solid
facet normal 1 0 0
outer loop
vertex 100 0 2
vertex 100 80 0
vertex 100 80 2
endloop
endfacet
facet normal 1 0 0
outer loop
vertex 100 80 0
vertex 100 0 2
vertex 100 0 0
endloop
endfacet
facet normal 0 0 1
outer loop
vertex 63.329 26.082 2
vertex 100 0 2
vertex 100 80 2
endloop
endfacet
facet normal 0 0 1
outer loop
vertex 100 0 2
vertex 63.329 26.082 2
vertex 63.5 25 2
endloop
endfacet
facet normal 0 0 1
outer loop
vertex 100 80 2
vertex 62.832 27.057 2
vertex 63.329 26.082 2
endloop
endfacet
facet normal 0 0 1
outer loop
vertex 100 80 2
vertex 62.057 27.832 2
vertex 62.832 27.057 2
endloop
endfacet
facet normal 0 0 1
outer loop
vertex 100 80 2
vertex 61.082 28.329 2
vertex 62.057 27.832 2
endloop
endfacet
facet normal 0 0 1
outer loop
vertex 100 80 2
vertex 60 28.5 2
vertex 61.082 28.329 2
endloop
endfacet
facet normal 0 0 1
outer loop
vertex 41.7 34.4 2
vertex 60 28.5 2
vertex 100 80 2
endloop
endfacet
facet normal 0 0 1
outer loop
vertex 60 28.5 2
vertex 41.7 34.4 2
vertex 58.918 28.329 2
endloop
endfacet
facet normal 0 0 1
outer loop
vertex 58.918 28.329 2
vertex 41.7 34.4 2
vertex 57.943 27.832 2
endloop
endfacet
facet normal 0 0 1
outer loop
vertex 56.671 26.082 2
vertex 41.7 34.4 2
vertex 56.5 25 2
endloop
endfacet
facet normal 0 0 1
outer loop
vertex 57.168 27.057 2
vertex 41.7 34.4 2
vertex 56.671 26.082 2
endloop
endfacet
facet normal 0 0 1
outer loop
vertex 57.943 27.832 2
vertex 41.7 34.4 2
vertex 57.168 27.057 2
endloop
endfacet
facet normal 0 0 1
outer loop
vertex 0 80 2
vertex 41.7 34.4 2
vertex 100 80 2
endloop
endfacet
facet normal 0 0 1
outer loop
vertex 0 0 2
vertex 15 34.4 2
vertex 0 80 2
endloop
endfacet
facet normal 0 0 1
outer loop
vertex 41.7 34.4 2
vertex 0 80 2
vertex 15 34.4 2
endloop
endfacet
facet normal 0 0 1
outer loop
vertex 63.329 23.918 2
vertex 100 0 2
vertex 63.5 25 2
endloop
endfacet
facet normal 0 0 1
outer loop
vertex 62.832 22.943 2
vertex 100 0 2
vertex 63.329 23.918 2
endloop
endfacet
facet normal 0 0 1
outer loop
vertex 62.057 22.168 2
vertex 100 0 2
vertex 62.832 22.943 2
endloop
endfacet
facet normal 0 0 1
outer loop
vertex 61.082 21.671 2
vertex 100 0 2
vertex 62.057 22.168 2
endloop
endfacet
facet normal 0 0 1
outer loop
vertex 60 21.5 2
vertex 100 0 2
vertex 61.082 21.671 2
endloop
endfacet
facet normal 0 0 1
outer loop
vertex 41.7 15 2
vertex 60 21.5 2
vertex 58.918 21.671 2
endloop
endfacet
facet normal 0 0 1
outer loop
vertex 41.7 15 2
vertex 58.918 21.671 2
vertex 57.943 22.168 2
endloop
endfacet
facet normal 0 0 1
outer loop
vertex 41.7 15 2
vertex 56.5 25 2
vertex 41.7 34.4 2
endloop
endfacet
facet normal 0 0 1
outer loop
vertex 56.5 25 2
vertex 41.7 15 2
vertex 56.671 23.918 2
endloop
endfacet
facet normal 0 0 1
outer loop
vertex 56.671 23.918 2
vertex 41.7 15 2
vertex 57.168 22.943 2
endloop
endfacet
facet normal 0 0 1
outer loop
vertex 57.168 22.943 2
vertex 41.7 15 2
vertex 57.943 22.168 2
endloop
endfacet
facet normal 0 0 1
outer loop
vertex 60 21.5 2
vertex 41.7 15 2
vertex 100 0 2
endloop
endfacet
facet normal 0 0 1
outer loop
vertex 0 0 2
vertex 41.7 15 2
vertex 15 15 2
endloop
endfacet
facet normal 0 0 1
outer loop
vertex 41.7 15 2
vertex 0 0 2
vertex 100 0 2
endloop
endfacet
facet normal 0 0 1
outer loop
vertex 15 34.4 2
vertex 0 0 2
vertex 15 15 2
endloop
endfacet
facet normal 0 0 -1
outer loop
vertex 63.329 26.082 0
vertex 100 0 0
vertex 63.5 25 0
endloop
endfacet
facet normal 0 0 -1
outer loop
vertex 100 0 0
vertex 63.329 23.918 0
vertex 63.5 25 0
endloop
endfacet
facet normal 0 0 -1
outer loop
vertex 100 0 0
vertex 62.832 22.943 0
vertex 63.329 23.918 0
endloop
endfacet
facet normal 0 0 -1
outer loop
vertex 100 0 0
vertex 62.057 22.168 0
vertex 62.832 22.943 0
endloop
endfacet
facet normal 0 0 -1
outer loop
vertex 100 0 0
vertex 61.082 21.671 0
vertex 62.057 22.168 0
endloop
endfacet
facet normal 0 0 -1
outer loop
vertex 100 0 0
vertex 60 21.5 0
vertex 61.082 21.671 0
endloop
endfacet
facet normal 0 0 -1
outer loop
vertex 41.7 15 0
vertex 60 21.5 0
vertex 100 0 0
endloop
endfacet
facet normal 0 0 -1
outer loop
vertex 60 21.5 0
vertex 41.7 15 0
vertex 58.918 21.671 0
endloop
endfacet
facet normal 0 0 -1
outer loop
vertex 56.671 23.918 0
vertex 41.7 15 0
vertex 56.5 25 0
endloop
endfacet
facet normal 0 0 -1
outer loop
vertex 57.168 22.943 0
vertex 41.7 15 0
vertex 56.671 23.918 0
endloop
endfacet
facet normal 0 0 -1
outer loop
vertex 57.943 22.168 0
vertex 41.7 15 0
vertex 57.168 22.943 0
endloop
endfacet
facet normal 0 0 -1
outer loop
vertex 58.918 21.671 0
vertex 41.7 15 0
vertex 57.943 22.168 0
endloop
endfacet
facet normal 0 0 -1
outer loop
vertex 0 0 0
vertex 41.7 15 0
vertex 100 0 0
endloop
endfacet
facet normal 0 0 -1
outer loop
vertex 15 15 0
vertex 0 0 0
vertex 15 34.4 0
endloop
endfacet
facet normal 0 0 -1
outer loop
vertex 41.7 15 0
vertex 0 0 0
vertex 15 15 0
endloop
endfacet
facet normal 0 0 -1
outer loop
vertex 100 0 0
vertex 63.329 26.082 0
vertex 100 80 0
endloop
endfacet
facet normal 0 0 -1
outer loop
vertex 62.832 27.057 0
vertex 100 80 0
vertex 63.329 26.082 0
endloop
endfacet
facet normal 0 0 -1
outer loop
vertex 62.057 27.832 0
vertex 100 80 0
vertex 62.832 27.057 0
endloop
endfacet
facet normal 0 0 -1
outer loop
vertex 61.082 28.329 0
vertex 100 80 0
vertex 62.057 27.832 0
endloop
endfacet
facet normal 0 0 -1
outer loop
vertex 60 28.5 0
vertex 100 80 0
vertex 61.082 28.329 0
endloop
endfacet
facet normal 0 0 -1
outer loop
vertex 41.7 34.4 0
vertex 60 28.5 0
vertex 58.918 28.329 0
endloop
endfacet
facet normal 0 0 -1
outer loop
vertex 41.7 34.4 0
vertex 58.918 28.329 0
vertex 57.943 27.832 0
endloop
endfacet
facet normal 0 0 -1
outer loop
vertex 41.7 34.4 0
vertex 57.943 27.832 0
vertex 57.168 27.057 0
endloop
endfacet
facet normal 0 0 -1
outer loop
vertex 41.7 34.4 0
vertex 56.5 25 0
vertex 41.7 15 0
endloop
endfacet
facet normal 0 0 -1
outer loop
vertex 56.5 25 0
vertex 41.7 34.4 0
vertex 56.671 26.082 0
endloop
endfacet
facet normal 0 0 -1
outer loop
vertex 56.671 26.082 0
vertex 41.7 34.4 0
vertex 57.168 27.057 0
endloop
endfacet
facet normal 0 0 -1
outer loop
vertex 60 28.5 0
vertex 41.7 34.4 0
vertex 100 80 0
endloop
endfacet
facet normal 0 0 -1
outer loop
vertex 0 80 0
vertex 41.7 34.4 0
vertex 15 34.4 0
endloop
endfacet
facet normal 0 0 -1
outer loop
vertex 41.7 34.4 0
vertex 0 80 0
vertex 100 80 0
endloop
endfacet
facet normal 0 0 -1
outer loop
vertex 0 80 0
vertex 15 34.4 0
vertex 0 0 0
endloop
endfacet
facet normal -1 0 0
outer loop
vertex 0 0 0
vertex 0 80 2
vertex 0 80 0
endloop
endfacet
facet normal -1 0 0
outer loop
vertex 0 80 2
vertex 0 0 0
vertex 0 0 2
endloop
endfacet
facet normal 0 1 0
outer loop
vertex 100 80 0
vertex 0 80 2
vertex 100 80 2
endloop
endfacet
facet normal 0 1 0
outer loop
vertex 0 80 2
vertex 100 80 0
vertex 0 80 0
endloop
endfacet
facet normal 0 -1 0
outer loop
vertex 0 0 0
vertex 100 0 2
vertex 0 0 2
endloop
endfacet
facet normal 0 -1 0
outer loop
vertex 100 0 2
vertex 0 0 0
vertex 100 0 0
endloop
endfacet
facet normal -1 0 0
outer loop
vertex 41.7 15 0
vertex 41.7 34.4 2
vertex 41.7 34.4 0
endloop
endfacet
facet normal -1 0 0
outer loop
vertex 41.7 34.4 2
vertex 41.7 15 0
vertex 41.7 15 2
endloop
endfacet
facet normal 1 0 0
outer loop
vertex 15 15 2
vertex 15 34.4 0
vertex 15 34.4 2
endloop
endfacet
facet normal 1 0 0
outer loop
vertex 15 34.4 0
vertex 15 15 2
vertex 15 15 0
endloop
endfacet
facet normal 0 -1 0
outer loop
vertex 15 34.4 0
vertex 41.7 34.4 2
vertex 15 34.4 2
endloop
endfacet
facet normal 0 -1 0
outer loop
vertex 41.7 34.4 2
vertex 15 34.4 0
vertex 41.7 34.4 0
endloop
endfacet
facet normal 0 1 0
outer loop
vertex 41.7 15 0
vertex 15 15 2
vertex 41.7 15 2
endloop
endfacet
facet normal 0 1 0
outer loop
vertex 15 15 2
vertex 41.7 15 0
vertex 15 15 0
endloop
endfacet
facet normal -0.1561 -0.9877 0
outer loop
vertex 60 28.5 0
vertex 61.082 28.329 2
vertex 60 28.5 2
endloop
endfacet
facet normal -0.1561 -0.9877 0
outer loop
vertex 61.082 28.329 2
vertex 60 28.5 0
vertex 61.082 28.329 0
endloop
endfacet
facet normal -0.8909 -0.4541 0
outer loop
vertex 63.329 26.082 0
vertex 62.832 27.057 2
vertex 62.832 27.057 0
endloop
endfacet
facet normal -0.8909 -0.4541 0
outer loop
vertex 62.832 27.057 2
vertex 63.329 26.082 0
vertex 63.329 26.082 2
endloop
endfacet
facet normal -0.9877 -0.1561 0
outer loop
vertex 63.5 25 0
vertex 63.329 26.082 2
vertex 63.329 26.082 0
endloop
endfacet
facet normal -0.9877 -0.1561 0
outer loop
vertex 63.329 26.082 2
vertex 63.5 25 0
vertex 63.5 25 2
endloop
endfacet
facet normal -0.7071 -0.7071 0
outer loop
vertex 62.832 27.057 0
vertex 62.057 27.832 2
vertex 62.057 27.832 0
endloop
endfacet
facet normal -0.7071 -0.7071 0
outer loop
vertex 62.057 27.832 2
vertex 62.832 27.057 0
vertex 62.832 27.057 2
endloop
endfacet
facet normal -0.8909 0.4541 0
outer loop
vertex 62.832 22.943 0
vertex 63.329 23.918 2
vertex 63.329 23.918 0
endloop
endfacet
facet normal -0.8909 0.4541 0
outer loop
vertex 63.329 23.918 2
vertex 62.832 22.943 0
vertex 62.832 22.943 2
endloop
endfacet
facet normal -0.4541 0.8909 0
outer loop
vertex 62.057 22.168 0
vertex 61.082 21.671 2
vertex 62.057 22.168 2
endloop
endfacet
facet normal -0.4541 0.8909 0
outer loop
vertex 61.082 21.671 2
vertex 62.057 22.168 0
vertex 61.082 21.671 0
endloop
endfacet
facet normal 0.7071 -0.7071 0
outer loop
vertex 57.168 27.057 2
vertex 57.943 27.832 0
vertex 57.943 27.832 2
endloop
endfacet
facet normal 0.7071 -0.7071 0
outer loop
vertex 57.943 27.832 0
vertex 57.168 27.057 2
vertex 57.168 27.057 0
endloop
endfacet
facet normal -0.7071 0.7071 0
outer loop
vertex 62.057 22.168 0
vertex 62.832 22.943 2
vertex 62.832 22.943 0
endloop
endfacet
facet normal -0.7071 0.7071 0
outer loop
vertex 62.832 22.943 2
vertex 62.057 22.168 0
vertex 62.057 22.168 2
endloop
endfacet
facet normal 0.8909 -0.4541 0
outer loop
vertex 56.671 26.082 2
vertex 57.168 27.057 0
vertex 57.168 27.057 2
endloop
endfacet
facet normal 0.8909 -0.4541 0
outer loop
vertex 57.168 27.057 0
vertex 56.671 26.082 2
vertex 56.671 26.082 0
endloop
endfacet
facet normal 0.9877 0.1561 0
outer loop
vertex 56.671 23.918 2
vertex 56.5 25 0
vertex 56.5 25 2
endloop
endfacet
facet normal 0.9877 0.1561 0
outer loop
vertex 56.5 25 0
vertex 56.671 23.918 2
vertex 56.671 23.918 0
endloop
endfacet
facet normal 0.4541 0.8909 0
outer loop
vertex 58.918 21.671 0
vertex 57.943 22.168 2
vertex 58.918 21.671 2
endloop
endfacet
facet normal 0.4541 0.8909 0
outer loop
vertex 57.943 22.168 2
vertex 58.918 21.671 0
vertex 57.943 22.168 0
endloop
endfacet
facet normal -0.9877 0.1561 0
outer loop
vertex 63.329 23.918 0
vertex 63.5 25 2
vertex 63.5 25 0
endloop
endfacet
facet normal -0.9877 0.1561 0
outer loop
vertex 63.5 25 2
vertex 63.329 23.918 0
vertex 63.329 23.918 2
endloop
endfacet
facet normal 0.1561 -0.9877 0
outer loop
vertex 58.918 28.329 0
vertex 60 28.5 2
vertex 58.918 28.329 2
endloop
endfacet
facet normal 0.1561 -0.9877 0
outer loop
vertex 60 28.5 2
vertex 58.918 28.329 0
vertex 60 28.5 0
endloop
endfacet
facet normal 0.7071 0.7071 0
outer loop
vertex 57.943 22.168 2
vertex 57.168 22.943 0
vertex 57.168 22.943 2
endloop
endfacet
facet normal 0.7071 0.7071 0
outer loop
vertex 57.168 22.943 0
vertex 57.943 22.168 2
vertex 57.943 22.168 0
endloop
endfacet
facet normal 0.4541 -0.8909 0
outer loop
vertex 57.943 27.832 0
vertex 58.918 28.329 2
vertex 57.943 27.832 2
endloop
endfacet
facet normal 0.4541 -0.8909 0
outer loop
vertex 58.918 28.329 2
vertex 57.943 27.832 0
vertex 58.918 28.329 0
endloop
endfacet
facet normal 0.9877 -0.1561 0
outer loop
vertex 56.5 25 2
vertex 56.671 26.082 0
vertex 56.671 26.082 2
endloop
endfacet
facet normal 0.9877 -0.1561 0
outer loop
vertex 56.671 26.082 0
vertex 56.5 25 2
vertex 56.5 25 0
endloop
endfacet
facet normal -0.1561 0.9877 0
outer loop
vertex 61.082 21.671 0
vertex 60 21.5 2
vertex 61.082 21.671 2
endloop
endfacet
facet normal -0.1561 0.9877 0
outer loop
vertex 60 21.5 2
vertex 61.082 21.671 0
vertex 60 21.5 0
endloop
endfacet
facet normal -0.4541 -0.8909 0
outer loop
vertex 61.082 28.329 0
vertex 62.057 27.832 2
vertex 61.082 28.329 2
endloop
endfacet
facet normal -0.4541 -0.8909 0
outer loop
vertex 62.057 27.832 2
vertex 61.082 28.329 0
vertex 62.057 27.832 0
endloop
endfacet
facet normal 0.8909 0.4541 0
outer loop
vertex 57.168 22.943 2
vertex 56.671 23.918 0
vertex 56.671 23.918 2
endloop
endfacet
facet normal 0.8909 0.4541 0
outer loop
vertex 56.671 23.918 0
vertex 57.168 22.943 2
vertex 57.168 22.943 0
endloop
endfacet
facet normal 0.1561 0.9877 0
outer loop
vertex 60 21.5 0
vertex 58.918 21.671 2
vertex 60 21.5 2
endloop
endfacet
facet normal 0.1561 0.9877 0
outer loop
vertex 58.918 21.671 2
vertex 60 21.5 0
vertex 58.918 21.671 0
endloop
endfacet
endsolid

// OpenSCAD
difference() {

cube([100, 80, 2]);

translate([15, 15, -0.5])
cube([26.7, 19.4, 3]);
    
translate([60, 25, -0.5])
cylinder(d=7, h=3, $fn=20);

}
